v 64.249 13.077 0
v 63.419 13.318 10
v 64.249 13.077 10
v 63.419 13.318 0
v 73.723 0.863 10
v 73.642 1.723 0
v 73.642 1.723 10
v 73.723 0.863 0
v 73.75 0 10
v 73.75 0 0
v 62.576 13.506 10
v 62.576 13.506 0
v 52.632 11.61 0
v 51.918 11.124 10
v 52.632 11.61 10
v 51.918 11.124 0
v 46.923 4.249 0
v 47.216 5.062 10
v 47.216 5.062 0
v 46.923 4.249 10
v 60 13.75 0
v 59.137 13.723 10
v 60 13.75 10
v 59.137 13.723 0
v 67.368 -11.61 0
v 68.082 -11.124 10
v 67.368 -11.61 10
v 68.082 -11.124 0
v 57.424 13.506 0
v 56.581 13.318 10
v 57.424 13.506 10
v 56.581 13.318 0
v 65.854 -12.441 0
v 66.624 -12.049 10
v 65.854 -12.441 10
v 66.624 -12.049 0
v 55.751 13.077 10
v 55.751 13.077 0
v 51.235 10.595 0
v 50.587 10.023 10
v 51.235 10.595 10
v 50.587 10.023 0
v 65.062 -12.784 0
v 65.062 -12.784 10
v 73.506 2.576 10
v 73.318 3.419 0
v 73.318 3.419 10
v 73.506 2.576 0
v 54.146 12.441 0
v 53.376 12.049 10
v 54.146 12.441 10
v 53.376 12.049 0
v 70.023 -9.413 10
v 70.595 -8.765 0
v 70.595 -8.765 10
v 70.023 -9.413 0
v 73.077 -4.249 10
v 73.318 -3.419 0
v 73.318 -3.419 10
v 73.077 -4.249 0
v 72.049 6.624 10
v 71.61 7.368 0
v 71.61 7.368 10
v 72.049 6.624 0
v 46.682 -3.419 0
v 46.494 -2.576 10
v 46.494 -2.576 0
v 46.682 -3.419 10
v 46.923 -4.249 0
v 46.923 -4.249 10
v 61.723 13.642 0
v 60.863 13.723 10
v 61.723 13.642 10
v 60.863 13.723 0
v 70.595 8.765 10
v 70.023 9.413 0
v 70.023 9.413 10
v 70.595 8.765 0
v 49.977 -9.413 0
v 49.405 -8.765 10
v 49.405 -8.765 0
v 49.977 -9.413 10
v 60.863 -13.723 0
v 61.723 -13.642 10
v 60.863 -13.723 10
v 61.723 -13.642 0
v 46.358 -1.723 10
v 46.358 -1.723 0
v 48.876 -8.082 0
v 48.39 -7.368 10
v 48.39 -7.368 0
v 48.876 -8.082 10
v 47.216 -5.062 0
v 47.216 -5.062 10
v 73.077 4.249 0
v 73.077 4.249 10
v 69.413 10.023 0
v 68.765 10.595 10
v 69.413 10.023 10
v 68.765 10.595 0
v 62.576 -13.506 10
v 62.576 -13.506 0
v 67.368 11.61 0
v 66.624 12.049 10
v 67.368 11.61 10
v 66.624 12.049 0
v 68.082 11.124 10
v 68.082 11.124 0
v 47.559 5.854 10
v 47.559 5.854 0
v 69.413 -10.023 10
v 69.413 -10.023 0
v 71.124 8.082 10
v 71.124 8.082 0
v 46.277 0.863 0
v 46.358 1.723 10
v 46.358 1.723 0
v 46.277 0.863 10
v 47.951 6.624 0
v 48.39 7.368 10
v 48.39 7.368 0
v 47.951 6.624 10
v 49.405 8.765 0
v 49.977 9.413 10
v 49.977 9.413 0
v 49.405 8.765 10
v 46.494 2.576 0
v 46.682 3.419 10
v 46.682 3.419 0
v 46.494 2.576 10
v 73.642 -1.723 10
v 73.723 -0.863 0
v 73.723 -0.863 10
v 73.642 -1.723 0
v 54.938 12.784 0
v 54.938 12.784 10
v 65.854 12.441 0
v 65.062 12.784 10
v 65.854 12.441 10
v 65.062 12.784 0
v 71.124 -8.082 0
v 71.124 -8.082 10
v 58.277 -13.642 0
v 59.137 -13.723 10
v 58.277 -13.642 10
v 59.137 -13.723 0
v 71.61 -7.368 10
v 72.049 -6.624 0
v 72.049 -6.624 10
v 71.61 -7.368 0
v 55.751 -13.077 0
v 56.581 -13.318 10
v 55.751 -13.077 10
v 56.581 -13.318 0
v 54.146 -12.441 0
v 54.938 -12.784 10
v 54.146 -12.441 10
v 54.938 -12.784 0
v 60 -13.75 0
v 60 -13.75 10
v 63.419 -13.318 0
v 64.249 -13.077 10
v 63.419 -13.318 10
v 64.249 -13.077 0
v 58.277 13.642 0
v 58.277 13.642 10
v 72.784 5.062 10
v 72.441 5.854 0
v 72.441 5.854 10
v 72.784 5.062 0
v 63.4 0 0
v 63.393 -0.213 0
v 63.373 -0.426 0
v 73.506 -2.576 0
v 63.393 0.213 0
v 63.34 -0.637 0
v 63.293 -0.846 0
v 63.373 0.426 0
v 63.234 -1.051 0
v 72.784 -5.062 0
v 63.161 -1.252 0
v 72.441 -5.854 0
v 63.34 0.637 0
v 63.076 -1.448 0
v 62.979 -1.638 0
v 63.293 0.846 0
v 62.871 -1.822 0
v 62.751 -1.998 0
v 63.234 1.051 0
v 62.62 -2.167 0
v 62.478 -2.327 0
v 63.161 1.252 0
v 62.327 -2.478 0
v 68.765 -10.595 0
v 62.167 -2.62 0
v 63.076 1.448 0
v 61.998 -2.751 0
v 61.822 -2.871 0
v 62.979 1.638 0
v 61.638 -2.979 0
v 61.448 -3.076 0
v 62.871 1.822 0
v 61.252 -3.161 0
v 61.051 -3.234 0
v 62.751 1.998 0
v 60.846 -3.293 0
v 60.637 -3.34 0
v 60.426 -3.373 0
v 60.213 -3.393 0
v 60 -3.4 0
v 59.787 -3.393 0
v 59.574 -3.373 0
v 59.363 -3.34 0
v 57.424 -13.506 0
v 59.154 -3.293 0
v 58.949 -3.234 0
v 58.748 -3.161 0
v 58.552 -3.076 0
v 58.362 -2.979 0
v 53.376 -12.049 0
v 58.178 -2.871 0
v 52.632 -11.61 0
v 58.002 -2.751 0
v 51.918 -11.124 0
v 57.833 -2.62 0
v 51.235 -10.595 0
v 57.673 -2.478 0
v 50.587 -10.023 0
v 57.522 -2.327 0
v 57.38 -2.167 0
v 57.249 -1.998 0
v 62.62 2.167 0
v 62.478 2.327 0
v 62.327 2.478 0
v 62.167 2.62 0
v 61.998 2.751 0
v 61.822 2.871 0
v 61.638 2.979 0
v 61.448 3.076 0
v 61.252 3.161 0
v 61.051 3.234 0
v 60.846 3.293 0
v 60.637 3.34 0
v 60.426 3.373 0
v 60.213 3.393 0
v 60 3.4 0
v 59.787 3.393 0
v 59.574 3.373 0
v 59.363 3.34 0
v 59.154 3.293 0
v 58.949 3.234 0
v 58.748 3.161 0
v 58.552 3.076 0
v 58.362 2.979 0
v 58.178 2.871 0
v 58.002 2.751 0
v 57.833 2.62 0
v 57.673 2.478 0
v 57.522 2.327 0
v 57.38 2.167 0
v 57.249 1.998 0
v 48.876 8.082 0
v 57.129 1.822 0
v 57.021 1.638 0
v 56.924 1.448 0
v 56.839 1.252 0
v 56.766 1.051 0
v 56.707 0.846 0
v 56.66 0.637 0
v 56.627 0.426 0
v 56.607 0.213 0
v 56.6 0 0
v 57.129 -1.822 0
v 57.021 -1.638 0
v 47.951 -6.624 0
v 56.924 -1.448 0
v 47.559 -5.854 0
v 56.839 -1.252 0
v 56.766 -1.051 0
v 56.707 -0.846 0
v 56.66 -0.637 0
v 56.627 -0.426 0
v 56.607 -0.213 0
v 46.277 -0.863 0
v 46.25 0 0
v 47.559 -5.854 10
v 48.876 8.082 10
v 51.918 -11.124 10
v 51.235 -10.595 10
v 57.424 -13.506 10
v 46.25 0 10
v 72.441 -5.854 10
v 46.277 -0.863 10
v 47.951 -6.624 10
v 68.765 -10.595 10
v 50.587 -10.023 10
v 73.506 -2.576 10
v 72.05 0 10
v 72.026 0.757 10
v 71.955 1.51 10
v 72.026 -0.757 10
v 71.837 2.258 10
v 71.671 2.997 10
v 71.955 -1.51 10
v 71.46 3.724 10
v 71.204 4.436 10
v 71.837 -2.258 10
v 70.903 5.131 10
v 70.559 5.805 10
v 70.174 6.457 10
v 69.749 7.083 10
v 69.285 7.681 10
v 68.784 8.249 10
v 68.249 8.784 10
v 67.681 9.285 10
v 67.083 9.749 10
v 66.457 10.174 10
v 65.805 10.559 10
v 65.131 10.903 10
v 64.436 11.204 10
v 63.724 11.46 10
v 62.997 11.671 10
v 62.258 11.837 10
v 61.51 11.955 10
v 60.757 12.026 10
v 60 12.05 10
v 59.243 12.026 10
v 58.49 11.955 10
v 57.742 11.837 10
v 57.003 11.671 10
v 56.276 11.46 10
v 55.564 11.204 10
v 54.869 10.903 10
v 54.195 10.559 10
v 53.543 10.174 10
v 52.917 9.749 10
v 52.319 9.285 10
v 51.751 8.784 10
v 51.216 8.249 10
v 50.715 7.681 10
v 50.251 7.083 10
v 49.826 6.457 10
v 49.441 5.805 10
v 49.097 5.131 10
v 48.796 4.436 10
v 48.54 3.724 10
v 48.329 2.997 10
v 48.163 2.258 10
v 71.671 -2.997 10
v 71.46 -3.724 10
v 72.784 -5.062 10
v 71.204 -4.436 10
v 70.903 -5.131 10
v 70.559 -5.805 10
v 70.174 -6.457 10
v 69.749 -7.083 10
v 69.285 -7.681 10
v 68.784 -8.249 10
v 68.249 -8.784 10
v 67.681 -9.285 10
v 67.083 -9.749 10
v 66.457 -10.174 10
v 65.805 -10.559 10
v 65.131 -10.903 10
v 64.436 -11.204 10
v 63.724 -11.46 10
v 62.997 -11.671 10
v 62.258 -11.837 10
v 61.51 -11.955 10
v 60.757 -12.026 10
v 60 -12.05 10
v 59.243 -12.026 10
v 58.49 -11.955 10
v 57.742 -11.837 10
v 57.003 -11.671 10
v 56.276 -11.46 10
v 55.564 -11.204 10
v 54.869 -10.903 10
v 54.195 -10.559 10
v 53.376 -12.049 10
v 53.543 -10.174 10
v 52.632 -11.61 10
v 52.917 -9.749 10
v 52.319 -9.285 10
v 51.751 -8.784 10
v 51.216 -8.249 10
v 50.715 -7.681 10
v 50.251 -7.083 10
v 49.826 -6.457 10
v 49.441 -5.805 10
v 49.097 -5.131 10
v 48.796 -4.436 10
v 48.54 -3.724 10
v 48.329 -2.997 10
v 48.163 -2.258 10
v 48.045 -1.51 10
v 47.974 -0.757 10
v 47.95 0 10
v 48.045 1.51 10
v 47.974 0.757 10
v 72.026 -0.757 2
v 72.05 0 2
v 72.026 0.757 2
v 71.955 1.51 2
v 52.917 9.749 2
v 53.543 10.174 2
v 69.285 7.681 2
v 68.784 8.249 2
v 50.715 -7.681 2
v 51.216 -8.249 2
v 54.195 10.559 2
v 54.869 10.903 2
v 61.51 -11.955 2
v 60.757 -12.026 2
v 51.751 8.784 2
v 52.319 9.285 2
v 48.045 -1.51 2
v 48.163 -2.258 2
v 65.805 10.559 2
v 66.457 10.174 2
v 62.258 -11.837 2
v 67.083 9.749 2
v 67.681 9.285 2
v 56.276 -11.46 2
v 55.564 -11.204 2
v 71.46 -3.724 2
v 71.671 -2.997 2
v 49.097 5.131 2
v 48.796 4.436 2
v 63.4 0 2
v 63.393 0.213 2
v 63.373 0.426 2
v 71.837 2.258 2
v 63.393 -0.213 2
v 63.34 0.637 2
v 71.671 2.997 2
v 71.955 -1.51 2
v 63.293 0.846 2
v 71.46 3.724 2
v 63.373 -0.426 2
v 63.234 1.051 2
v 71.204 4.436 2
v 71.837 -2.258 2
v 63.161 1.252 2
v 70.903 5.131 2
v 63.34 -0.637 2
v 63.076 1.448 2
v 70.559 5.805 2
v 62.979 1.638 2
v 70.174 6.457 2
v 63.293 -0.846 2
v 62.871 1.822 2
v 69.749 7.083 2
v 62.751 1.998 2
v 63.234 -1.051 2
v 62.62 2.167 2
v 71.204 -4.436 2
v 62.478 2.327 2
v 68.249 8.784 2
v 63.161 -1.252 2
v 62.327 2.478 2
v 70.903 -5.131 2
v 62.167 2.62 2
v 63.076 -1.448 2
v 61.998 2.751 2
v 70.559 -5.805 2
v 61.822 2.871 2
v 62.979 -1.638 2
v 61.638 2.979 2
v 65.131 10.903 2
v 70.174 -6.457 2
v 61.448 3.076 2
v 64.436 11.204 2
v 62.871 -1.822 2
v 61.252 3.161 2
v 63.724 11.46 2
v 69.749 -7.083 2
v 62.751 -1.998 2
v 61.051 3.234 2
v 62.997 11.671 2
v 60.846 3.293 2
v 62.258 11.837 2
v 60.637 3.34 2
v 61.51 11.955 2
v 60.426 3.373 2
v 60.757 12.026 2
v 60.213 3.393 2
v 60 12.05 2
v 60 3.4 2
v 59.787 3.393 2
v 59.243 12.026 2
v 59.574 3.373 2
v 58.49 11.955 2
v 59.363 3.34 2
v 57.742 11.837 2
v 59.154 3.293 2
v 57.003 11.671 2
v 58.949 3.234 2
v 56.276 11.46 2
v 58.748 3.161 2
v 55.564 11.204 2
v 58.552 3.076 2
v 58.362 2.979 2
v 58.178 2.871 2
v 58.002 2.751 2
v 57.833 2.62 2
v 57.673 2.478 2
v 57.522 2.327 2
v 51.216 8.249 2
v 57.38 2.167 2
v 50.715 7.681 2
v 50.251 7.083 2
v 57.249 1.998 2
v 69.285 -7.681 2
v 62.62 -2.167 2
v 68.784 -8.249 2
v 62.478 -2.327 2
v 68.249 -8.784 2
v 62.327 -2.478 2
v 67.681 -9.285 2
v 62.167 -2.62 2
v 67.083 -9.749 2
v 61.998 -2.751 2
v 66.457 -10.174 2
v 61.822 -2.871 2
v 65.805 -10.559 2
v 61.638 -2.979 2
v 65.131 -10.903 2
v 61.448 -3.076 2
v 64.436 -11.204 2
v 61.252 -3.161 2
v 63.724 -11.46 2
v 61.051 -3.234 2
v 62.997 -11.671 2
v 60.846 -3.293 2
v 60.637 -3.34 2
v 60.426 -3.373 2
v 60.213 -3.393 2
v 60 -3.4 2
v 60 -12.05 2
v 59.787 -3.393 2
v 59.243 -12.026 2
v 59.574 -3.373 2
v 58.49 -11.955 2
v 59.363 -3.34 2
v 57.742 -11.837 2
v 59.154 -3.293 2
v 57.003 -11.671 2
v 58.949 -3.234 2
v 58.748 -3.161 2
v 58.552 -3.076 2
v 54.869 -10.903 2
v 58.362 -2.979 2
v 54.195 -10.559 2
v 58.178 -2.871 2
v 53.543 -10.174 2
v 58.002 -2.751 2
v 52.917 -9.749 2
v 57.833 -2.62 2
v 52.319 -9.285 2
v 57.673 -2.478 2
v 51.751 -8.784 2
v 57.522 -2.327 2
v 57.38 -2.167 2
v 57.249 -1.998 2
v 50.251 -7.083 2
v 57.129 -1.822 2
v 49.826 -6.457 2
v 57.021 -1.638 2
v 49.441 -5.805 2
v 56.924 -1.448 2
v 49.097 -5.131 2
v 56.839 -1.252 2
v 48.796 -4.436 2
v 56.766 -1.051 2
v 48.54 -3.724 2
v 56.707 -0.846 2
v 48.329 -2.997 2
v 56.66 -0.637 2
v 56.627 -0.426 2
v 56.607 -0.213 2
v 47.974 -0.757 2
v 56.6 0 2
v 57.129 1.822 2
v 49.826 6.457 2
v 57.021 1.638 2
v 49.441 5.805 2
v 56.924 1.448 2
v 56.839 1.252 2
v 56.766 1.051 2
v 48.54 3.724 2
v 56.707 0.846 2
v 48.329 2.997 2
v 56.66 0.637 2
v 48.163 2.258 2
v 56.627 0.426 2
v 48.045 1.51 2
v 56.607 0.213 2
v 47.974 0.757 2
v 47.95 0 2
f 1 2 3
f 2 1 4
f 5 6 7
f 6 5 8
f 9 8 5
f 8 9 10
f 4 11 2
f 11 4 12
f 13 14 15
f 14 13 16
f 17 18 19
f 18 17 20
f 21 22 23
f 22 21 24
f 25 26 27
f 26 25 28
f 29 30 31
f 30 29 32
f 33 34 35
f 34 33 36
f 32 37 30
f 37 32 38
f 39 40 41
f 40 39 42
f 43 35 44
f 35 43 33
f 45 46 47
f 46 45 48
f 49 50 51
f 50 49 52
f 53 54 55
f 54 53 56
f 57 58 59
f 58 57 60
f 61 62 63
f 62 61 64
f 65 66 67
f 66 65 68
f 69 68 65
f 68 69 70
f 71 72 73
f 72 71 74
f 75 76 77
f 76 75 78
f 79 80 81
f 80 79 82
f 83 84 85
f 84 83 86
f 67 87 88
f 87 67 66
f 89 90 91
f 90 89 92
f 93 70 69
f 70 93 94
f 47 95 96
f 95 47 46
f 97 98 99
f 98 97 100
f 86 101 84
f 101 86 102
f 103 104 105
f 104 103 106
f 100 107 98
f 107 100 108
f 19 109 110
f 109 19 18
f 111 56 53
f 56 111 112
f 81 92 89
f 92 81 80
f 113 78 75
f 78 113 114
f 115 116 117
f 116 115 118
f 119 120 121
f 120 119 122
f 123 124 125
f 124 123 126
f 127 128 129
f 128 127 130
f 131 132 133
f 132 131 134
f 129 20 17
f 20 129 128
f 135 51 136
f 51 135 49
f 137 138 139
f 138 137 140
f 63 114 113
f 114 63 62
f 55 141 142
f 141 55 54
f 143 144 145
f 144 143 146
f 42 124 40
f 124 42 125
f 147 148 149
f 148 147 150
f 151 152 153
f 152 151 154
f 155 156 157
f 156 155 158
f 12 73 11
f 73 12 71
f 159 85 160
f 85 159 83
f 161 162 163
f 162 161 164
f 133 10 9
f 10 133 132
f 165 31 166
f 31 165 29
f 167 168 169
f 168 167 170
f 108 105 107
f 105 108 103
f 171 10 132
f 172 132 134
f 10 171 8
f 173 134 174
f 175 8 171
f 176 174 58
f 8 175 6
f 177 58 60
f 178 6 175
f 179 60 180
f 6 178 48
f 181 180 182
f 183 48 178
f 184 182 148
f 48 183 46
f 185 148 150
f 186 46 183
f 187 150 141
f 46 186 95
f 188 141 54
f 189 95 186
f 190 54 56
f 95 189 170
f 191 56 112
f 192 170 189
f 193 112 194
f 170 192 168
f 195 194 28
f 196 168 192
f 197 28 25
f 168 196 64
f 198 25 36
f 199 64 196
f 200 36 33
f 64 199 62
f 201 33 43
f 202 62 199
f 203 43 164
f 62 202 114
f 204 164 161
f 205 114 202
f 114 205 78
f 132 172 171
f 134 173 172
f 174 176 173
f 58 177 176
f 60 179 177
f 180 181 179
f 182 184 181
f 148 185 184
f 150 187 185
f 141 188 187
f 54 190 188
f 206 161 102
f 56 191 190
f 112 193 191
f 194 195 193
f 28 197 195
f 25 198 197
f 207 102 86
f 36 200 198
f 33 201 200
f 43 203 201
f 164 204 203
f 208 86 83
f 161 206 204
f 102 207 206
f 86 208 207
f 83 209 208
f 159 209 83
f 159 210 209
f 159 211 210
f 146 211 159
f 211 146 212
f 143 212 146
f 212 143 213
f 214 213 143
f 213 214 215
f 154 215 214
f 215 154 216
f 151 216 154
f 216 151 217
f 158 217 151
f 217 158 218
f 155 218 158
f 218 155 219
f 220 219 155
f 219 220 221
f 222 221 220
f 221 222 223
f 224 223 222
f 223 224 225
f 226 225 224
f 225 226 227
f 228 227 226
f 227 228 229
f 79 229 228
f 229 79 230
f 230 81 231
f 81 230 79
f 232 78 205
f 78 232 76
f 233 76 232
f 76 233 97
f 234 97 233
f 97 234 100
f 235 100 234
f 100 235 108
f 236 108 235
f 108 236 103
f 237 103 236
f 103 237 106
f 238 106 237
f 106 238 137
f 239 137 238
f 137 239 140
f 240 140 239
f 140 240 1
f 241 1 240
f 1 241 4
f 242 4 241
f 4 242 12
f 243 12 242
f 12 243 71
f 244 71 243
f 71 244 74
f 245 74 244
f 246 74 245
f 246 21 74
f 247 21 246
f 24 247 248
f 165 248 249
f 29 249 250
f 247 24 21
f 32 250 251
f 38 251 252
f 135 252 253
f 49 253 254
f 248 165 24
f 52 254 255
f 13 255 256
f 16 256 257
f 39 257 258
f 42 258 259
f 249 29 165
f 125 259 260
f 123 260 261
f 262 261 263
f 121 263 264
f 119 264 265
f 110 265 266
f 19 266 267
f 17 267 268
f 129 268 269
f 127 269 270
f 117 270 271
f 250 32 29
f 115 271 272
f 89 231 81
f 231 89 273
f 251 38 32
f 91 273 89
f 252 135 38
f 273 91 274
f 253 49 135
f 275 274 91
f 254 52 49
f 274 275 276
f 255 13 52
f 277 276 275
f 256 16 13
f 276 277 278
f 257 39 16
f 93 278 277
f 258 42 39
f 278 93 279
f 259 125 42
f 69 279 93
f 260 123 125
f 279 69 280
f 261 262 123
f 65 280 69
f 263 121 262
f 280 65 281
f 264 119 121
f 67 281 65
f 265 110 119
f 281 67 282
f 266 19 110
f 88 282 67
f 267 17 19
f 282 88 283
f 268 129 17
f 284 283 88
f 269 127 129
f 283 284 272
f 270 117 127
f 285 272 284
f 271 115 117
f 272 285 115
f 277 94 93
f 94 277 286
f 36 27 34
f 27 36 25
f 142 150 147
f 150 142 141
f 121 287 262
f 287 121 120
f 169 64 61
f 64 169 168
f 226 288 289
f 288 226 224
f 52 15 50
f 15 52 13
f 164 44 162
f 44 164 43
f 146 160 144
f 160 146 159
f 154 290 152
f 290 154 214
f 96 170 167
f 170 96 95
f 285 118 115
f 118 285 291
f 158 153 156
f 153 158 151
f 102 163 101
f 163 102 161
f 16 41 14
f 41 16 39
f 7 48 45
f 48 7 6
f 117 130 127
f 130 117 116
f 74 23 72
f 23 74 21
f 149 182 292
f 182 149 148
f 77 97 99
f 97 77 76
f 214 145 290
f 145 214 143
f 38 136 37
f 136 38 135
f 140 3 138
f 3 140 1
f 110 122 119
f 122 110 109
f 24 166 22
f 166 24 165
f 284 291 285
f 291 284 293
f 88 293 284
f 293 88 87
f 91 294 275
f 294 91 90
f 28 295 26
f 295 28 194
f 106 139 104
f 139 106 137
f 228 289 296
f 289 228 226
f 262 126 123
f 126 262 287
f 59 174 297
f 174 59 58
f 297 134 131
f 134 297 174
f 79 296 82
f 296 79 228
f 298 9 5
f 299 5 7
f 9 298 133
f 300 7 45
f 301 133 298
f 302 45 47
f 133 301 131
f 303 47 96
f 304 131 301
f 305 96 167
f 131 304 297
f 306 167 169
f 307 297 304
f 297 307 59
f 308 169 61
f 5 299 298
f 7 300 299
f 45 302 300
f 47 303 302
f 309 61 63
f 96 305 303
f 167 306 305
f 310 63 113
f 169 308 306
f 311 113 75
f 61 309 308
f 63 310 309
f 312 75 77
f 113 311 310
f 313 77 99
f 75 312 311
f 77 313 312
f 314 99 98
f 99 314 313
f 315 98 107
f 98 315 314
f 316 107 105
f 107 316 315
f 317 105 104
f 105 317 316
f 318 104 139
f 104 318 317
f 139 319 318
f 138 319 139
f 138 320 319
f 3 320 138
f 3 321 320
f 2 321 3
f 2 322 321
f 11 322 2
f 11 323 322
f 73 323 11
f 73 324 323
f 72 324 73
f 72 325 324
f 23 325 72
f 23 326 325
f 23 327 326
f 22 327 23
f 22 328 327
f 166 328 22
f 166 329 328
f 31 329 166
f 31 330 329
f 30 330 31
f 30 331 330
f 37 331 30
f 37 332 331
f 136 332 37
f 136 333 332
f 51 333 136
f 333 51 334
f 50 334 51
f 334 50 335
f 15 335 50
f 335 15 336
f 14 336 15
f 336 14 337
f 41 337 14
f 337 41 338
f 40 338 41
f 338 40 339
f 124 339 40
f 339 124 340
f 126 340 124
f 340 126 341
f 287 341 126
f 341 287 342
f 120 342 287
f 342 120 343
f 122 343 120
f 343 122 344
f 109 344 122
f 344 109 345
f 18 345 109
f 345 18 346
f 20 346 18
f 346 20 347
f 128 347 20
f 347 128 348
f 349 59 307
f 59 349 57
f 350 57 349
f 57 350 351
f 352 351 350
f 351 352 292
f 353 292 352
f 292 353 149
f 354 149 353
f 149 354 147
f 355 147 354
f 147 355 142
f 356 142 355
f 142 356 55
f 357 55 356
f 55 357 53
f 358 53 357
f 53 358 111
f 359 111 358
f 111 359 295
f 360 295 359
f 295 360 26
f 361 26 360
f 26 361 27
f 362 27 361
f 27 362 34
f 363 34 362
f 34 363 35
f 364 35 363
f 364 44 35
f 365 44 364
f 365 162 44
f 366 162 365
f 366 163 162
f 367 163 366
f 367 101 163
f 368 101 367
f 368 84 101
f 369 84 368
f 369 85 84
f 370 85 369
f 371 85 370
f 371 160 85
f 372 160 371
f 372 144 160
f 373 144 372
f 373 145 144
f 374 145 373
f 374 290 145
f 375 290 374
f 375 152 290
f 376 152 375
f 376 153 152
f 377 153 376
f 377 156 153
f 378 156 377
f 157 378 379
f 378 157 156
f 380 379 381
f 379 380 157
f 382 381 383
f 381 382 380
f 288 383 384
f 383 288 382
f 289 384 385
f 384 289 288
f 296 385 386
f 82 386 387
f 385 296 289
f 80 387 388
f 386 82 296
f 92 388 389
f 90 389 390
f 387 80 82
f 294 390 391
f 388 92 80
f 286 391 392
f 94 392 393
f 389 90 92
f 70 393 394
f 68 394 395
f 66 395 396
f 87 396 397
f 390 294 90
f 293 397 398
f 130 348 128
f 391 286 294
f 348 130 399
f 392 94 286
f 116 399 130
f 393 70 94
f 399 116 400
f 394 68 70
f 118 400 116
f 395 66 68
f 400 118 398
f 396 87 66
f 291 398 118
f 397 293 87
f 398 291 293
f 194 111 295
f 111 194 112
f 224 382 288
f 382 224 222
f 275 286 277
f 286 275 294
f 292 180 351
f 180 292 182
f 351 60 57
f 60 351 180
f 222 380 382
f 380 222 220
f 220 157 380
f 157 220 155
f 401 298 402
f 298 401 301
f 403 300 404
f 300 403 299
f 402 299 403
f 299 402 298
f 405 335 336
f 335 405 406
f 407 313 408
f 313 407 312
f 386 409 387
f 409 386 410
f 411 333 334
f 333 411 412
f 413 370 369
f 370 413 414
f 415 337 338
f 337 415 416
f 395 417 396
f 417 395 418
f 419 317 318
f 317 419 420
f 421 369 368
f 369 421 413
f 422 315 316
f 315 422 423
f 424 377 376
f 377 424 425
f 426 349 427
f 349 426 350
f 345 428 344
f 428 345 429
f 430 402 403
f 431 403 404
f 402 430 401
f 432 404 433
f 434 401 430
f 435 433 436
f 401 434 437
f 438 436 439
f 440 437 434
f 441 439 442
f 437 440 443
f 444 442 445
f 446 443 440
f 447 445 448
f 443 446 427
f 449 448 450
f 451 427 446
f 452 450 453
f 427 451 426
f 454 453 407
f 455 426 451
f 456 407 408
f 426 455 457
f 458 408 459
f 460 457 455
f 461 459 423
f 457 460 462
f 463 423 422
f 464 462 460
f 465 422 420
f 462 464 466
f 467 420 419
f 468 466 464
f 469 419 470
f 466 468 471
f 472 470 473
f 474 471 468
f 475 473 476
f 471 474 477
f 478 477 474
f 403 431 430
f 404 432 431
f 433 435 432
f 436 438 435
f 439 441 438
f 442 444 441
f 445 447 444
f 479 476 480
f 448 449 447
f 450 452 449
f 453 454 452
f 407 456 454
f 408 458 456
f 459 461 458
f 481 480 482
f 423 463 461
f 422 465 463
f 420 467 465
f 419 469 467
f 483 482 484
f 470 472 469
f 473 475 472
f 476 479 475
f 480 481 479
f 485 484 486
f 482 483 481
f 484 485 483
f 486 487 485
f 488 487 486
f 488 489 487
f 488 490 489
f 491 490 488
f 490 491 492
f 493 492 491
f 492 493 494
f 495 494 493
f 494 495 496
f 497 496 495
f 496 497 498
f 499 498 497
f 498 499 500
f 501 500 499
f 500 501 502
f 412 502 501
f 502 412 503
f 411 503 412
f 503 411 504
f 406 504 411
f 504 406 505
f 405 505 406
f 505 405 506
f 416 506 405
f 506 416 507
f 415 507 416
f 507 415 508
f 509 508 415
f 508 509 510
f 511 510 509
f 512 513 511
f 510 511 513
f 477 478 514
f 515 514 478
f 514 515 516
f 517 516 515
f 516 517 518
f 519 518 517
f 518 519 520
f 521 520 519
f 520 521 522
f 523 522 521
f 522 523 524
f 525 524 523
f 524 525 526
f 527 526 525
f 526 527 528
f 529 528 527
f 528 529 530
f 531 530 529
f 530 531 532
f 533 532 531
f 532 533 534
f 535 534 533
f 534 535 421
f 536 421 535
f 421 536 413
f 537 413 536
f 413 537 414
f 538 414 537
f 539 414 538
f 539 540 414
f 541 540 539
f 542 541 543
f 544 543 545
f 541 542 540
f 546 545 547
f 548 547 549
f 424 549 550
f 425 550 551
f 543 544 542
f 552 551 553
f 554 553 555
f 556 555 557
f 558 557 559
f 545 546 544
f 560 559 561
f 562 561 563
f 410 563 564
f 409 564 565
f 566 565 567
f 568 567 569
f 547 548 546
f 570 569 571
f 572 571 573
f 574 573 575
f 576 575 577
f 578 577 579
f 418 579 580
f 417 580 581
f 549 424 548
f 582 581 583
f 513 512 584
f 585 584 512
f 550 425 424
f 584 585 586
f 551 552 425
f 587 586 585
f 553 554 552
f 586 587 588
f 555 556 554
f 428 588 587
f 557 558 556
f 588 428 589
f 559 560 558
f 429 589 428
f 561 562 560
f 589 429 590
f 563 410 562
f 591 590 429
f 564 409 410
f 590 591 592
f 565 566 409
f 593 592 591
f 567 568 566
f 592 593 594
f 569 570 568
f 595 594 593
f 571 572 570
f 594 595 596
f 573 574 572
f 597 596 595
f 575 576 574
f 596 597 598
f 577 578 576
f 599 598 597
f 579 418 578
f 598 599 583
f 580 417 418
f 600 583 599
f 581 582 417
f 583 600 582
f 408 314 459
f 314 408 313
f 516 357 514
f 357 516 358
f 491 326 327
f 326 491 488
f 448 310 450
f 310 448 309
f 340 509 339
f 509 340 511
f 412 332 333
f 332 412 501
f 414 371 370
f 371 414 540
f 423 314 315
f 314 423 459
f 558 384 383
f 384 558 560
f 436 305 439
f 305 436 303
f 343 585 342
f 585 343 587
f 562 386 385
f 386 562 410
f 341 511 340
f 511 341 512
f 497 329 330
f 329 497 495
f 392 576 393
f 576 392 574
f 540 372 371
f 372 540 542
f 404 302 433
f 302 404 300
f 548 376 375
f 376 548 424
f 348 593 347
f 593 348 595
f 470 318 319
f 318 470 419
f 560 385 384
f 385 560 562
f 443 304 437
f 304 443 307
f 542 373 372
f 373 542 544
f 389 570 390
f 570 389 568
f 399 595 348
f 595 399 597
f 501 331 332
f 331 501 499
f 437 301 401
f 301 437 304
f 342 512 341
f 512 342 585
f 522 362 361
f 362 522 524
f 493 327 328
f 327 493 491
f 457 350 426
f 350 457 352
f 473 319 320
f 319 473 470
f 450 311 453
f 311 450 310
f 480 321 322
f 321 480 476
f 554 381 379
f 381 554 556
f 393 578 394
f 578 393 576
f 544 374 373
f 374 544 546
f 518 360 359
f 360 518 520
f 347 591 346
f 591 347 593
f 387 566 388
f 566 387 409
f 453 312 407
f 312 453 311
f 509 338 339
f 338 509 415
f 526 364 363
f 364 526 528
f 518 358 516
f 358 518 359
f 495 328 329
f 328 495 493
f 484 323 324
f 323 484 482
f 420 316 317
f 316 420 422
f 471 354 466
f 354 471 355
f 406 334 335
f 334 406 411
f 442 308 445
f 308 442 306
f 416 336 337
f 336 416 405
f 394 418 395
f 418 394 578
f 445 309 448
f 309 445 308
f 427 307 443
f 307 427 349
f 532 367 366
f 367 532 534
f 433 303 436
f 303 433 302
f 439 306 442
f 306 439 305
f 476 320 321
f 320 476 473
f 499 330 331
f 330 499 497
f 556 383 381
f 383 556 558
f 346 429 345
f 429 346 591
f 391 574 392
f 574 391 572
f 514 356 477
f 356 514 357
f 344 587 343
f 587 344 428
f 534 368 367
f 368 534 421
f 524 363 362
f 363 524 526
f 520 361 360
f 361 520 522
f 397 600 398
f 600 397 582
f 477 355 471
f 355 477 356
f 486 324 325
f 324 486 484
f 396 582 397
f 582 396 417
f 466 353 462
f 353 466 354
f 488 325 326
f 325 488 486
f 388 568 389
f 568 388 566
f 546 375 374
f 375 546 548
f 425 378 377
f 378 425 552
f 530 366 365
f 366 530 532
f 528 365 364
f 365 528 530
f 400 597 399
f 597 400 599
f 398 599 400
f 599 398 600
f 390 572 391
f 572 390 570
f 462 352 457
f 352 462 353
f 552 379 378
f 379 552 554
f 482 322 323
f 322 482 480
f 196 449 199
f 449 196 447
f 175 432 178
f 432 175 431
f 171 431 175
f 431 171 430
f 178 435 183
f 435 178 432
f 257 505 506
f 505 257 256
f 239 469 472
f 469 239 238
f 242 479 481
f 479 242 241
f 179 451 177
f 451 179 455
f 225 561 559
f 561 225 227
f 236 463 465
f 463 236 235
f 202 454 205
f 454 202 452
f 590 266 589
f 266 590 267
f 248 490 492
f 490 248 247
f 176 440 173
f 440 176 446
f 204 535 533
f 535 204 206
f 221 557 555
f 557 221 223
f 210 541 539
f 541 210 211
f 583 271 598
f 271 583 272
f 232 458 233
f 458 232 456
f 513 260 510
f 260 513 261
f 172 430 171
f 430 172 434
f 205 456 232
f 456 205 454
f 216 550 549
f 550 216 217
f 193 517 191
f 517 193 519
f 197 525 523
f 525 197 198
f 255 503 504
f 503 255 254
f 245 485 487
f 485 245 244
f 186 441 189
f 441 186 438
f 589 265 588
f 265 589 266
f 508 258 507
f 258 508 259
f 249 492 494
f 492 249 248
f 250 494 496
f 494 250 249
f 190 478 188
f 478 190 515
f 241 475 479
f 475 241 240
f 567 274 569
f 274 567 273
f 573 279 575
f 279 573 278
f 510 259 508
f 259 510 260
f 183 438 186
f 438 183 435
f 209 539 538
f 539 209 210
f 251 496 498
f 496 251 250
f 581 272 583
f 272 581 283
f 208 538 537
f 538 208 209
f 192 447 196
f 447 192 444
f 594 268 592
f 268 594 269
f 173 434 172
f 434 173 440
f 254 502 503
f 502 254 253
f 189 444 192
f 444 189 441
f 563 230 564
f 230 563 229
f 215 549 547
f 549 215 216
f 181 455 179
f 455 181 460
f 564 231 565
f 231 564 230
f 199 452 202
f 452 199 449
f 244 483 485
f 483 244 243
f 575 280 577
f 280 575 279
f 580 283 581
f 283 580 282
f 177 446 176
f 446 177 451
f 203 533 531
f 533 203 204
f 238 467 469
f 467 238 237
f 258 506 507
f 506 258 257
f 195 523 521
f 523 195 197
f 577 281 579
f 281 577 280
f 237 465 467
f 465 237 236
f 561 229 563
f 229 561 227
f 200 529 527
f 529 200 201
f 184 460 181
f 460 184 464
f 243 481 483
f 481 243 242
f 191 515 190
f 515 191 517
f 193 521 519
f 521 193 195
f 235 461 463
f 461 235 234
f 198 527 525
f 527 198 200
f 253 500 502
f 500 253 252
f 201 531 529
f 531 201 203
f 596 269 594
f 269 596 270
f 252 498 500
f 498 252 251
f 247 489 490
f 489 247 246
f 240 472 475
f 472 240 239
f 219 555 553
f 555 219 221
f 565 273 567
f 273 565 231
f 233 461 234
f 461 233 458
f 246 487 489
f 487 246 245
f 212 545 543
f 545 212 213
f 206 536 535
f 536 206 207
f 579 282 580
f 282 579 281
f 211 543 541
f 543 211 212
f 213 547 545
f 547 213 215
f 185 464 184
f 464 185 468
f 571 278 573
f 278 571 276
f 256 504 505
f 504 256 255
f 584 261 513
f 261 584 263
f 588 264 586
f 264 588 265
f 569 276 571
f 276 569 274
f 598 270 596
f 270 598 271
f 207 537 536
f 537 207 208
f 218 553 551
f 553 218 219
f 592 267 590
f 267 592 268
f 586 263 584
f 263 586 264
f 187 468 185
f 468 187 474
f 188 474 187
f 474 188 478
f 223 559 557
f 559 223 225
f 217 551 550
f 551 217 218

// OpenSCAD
oring = 19.5;

/*
difference() {
	cylinder( r=oring/2+2, h=50, $fn=100 );
	translate( [0,0,2] ) cylinder( r=oring/2+0.3, h=240, $fn=100 );
}


translate( [30,0,0] ) {
	union() {
		difference() {
			cylinder( r=oring/2-0.5, h=4, $fn=100 );
			difference() {
				translate([0,0,1]) cylinder( r=oring/2, h=1.5, $fn=100 );
				translate([0,0,-2]) cylinder( r=oring/2-2, h=6, $fn=100 );
			}
		}
		cylinder( r=3, h=60, $fn=100 );
	}
}
*/

translate( [60,0,0] ) {
	difference() {
		cylinder( r=oring/2+4, h=10, $fn=100 );
		translate( [0,0,2] ) cylinder( r=oring/2+2.3, h=240, $fn=100 );
		translate( [0,0,-1] ) cylinder( r=3.4, h=10, $fn=100 );
	}
}
